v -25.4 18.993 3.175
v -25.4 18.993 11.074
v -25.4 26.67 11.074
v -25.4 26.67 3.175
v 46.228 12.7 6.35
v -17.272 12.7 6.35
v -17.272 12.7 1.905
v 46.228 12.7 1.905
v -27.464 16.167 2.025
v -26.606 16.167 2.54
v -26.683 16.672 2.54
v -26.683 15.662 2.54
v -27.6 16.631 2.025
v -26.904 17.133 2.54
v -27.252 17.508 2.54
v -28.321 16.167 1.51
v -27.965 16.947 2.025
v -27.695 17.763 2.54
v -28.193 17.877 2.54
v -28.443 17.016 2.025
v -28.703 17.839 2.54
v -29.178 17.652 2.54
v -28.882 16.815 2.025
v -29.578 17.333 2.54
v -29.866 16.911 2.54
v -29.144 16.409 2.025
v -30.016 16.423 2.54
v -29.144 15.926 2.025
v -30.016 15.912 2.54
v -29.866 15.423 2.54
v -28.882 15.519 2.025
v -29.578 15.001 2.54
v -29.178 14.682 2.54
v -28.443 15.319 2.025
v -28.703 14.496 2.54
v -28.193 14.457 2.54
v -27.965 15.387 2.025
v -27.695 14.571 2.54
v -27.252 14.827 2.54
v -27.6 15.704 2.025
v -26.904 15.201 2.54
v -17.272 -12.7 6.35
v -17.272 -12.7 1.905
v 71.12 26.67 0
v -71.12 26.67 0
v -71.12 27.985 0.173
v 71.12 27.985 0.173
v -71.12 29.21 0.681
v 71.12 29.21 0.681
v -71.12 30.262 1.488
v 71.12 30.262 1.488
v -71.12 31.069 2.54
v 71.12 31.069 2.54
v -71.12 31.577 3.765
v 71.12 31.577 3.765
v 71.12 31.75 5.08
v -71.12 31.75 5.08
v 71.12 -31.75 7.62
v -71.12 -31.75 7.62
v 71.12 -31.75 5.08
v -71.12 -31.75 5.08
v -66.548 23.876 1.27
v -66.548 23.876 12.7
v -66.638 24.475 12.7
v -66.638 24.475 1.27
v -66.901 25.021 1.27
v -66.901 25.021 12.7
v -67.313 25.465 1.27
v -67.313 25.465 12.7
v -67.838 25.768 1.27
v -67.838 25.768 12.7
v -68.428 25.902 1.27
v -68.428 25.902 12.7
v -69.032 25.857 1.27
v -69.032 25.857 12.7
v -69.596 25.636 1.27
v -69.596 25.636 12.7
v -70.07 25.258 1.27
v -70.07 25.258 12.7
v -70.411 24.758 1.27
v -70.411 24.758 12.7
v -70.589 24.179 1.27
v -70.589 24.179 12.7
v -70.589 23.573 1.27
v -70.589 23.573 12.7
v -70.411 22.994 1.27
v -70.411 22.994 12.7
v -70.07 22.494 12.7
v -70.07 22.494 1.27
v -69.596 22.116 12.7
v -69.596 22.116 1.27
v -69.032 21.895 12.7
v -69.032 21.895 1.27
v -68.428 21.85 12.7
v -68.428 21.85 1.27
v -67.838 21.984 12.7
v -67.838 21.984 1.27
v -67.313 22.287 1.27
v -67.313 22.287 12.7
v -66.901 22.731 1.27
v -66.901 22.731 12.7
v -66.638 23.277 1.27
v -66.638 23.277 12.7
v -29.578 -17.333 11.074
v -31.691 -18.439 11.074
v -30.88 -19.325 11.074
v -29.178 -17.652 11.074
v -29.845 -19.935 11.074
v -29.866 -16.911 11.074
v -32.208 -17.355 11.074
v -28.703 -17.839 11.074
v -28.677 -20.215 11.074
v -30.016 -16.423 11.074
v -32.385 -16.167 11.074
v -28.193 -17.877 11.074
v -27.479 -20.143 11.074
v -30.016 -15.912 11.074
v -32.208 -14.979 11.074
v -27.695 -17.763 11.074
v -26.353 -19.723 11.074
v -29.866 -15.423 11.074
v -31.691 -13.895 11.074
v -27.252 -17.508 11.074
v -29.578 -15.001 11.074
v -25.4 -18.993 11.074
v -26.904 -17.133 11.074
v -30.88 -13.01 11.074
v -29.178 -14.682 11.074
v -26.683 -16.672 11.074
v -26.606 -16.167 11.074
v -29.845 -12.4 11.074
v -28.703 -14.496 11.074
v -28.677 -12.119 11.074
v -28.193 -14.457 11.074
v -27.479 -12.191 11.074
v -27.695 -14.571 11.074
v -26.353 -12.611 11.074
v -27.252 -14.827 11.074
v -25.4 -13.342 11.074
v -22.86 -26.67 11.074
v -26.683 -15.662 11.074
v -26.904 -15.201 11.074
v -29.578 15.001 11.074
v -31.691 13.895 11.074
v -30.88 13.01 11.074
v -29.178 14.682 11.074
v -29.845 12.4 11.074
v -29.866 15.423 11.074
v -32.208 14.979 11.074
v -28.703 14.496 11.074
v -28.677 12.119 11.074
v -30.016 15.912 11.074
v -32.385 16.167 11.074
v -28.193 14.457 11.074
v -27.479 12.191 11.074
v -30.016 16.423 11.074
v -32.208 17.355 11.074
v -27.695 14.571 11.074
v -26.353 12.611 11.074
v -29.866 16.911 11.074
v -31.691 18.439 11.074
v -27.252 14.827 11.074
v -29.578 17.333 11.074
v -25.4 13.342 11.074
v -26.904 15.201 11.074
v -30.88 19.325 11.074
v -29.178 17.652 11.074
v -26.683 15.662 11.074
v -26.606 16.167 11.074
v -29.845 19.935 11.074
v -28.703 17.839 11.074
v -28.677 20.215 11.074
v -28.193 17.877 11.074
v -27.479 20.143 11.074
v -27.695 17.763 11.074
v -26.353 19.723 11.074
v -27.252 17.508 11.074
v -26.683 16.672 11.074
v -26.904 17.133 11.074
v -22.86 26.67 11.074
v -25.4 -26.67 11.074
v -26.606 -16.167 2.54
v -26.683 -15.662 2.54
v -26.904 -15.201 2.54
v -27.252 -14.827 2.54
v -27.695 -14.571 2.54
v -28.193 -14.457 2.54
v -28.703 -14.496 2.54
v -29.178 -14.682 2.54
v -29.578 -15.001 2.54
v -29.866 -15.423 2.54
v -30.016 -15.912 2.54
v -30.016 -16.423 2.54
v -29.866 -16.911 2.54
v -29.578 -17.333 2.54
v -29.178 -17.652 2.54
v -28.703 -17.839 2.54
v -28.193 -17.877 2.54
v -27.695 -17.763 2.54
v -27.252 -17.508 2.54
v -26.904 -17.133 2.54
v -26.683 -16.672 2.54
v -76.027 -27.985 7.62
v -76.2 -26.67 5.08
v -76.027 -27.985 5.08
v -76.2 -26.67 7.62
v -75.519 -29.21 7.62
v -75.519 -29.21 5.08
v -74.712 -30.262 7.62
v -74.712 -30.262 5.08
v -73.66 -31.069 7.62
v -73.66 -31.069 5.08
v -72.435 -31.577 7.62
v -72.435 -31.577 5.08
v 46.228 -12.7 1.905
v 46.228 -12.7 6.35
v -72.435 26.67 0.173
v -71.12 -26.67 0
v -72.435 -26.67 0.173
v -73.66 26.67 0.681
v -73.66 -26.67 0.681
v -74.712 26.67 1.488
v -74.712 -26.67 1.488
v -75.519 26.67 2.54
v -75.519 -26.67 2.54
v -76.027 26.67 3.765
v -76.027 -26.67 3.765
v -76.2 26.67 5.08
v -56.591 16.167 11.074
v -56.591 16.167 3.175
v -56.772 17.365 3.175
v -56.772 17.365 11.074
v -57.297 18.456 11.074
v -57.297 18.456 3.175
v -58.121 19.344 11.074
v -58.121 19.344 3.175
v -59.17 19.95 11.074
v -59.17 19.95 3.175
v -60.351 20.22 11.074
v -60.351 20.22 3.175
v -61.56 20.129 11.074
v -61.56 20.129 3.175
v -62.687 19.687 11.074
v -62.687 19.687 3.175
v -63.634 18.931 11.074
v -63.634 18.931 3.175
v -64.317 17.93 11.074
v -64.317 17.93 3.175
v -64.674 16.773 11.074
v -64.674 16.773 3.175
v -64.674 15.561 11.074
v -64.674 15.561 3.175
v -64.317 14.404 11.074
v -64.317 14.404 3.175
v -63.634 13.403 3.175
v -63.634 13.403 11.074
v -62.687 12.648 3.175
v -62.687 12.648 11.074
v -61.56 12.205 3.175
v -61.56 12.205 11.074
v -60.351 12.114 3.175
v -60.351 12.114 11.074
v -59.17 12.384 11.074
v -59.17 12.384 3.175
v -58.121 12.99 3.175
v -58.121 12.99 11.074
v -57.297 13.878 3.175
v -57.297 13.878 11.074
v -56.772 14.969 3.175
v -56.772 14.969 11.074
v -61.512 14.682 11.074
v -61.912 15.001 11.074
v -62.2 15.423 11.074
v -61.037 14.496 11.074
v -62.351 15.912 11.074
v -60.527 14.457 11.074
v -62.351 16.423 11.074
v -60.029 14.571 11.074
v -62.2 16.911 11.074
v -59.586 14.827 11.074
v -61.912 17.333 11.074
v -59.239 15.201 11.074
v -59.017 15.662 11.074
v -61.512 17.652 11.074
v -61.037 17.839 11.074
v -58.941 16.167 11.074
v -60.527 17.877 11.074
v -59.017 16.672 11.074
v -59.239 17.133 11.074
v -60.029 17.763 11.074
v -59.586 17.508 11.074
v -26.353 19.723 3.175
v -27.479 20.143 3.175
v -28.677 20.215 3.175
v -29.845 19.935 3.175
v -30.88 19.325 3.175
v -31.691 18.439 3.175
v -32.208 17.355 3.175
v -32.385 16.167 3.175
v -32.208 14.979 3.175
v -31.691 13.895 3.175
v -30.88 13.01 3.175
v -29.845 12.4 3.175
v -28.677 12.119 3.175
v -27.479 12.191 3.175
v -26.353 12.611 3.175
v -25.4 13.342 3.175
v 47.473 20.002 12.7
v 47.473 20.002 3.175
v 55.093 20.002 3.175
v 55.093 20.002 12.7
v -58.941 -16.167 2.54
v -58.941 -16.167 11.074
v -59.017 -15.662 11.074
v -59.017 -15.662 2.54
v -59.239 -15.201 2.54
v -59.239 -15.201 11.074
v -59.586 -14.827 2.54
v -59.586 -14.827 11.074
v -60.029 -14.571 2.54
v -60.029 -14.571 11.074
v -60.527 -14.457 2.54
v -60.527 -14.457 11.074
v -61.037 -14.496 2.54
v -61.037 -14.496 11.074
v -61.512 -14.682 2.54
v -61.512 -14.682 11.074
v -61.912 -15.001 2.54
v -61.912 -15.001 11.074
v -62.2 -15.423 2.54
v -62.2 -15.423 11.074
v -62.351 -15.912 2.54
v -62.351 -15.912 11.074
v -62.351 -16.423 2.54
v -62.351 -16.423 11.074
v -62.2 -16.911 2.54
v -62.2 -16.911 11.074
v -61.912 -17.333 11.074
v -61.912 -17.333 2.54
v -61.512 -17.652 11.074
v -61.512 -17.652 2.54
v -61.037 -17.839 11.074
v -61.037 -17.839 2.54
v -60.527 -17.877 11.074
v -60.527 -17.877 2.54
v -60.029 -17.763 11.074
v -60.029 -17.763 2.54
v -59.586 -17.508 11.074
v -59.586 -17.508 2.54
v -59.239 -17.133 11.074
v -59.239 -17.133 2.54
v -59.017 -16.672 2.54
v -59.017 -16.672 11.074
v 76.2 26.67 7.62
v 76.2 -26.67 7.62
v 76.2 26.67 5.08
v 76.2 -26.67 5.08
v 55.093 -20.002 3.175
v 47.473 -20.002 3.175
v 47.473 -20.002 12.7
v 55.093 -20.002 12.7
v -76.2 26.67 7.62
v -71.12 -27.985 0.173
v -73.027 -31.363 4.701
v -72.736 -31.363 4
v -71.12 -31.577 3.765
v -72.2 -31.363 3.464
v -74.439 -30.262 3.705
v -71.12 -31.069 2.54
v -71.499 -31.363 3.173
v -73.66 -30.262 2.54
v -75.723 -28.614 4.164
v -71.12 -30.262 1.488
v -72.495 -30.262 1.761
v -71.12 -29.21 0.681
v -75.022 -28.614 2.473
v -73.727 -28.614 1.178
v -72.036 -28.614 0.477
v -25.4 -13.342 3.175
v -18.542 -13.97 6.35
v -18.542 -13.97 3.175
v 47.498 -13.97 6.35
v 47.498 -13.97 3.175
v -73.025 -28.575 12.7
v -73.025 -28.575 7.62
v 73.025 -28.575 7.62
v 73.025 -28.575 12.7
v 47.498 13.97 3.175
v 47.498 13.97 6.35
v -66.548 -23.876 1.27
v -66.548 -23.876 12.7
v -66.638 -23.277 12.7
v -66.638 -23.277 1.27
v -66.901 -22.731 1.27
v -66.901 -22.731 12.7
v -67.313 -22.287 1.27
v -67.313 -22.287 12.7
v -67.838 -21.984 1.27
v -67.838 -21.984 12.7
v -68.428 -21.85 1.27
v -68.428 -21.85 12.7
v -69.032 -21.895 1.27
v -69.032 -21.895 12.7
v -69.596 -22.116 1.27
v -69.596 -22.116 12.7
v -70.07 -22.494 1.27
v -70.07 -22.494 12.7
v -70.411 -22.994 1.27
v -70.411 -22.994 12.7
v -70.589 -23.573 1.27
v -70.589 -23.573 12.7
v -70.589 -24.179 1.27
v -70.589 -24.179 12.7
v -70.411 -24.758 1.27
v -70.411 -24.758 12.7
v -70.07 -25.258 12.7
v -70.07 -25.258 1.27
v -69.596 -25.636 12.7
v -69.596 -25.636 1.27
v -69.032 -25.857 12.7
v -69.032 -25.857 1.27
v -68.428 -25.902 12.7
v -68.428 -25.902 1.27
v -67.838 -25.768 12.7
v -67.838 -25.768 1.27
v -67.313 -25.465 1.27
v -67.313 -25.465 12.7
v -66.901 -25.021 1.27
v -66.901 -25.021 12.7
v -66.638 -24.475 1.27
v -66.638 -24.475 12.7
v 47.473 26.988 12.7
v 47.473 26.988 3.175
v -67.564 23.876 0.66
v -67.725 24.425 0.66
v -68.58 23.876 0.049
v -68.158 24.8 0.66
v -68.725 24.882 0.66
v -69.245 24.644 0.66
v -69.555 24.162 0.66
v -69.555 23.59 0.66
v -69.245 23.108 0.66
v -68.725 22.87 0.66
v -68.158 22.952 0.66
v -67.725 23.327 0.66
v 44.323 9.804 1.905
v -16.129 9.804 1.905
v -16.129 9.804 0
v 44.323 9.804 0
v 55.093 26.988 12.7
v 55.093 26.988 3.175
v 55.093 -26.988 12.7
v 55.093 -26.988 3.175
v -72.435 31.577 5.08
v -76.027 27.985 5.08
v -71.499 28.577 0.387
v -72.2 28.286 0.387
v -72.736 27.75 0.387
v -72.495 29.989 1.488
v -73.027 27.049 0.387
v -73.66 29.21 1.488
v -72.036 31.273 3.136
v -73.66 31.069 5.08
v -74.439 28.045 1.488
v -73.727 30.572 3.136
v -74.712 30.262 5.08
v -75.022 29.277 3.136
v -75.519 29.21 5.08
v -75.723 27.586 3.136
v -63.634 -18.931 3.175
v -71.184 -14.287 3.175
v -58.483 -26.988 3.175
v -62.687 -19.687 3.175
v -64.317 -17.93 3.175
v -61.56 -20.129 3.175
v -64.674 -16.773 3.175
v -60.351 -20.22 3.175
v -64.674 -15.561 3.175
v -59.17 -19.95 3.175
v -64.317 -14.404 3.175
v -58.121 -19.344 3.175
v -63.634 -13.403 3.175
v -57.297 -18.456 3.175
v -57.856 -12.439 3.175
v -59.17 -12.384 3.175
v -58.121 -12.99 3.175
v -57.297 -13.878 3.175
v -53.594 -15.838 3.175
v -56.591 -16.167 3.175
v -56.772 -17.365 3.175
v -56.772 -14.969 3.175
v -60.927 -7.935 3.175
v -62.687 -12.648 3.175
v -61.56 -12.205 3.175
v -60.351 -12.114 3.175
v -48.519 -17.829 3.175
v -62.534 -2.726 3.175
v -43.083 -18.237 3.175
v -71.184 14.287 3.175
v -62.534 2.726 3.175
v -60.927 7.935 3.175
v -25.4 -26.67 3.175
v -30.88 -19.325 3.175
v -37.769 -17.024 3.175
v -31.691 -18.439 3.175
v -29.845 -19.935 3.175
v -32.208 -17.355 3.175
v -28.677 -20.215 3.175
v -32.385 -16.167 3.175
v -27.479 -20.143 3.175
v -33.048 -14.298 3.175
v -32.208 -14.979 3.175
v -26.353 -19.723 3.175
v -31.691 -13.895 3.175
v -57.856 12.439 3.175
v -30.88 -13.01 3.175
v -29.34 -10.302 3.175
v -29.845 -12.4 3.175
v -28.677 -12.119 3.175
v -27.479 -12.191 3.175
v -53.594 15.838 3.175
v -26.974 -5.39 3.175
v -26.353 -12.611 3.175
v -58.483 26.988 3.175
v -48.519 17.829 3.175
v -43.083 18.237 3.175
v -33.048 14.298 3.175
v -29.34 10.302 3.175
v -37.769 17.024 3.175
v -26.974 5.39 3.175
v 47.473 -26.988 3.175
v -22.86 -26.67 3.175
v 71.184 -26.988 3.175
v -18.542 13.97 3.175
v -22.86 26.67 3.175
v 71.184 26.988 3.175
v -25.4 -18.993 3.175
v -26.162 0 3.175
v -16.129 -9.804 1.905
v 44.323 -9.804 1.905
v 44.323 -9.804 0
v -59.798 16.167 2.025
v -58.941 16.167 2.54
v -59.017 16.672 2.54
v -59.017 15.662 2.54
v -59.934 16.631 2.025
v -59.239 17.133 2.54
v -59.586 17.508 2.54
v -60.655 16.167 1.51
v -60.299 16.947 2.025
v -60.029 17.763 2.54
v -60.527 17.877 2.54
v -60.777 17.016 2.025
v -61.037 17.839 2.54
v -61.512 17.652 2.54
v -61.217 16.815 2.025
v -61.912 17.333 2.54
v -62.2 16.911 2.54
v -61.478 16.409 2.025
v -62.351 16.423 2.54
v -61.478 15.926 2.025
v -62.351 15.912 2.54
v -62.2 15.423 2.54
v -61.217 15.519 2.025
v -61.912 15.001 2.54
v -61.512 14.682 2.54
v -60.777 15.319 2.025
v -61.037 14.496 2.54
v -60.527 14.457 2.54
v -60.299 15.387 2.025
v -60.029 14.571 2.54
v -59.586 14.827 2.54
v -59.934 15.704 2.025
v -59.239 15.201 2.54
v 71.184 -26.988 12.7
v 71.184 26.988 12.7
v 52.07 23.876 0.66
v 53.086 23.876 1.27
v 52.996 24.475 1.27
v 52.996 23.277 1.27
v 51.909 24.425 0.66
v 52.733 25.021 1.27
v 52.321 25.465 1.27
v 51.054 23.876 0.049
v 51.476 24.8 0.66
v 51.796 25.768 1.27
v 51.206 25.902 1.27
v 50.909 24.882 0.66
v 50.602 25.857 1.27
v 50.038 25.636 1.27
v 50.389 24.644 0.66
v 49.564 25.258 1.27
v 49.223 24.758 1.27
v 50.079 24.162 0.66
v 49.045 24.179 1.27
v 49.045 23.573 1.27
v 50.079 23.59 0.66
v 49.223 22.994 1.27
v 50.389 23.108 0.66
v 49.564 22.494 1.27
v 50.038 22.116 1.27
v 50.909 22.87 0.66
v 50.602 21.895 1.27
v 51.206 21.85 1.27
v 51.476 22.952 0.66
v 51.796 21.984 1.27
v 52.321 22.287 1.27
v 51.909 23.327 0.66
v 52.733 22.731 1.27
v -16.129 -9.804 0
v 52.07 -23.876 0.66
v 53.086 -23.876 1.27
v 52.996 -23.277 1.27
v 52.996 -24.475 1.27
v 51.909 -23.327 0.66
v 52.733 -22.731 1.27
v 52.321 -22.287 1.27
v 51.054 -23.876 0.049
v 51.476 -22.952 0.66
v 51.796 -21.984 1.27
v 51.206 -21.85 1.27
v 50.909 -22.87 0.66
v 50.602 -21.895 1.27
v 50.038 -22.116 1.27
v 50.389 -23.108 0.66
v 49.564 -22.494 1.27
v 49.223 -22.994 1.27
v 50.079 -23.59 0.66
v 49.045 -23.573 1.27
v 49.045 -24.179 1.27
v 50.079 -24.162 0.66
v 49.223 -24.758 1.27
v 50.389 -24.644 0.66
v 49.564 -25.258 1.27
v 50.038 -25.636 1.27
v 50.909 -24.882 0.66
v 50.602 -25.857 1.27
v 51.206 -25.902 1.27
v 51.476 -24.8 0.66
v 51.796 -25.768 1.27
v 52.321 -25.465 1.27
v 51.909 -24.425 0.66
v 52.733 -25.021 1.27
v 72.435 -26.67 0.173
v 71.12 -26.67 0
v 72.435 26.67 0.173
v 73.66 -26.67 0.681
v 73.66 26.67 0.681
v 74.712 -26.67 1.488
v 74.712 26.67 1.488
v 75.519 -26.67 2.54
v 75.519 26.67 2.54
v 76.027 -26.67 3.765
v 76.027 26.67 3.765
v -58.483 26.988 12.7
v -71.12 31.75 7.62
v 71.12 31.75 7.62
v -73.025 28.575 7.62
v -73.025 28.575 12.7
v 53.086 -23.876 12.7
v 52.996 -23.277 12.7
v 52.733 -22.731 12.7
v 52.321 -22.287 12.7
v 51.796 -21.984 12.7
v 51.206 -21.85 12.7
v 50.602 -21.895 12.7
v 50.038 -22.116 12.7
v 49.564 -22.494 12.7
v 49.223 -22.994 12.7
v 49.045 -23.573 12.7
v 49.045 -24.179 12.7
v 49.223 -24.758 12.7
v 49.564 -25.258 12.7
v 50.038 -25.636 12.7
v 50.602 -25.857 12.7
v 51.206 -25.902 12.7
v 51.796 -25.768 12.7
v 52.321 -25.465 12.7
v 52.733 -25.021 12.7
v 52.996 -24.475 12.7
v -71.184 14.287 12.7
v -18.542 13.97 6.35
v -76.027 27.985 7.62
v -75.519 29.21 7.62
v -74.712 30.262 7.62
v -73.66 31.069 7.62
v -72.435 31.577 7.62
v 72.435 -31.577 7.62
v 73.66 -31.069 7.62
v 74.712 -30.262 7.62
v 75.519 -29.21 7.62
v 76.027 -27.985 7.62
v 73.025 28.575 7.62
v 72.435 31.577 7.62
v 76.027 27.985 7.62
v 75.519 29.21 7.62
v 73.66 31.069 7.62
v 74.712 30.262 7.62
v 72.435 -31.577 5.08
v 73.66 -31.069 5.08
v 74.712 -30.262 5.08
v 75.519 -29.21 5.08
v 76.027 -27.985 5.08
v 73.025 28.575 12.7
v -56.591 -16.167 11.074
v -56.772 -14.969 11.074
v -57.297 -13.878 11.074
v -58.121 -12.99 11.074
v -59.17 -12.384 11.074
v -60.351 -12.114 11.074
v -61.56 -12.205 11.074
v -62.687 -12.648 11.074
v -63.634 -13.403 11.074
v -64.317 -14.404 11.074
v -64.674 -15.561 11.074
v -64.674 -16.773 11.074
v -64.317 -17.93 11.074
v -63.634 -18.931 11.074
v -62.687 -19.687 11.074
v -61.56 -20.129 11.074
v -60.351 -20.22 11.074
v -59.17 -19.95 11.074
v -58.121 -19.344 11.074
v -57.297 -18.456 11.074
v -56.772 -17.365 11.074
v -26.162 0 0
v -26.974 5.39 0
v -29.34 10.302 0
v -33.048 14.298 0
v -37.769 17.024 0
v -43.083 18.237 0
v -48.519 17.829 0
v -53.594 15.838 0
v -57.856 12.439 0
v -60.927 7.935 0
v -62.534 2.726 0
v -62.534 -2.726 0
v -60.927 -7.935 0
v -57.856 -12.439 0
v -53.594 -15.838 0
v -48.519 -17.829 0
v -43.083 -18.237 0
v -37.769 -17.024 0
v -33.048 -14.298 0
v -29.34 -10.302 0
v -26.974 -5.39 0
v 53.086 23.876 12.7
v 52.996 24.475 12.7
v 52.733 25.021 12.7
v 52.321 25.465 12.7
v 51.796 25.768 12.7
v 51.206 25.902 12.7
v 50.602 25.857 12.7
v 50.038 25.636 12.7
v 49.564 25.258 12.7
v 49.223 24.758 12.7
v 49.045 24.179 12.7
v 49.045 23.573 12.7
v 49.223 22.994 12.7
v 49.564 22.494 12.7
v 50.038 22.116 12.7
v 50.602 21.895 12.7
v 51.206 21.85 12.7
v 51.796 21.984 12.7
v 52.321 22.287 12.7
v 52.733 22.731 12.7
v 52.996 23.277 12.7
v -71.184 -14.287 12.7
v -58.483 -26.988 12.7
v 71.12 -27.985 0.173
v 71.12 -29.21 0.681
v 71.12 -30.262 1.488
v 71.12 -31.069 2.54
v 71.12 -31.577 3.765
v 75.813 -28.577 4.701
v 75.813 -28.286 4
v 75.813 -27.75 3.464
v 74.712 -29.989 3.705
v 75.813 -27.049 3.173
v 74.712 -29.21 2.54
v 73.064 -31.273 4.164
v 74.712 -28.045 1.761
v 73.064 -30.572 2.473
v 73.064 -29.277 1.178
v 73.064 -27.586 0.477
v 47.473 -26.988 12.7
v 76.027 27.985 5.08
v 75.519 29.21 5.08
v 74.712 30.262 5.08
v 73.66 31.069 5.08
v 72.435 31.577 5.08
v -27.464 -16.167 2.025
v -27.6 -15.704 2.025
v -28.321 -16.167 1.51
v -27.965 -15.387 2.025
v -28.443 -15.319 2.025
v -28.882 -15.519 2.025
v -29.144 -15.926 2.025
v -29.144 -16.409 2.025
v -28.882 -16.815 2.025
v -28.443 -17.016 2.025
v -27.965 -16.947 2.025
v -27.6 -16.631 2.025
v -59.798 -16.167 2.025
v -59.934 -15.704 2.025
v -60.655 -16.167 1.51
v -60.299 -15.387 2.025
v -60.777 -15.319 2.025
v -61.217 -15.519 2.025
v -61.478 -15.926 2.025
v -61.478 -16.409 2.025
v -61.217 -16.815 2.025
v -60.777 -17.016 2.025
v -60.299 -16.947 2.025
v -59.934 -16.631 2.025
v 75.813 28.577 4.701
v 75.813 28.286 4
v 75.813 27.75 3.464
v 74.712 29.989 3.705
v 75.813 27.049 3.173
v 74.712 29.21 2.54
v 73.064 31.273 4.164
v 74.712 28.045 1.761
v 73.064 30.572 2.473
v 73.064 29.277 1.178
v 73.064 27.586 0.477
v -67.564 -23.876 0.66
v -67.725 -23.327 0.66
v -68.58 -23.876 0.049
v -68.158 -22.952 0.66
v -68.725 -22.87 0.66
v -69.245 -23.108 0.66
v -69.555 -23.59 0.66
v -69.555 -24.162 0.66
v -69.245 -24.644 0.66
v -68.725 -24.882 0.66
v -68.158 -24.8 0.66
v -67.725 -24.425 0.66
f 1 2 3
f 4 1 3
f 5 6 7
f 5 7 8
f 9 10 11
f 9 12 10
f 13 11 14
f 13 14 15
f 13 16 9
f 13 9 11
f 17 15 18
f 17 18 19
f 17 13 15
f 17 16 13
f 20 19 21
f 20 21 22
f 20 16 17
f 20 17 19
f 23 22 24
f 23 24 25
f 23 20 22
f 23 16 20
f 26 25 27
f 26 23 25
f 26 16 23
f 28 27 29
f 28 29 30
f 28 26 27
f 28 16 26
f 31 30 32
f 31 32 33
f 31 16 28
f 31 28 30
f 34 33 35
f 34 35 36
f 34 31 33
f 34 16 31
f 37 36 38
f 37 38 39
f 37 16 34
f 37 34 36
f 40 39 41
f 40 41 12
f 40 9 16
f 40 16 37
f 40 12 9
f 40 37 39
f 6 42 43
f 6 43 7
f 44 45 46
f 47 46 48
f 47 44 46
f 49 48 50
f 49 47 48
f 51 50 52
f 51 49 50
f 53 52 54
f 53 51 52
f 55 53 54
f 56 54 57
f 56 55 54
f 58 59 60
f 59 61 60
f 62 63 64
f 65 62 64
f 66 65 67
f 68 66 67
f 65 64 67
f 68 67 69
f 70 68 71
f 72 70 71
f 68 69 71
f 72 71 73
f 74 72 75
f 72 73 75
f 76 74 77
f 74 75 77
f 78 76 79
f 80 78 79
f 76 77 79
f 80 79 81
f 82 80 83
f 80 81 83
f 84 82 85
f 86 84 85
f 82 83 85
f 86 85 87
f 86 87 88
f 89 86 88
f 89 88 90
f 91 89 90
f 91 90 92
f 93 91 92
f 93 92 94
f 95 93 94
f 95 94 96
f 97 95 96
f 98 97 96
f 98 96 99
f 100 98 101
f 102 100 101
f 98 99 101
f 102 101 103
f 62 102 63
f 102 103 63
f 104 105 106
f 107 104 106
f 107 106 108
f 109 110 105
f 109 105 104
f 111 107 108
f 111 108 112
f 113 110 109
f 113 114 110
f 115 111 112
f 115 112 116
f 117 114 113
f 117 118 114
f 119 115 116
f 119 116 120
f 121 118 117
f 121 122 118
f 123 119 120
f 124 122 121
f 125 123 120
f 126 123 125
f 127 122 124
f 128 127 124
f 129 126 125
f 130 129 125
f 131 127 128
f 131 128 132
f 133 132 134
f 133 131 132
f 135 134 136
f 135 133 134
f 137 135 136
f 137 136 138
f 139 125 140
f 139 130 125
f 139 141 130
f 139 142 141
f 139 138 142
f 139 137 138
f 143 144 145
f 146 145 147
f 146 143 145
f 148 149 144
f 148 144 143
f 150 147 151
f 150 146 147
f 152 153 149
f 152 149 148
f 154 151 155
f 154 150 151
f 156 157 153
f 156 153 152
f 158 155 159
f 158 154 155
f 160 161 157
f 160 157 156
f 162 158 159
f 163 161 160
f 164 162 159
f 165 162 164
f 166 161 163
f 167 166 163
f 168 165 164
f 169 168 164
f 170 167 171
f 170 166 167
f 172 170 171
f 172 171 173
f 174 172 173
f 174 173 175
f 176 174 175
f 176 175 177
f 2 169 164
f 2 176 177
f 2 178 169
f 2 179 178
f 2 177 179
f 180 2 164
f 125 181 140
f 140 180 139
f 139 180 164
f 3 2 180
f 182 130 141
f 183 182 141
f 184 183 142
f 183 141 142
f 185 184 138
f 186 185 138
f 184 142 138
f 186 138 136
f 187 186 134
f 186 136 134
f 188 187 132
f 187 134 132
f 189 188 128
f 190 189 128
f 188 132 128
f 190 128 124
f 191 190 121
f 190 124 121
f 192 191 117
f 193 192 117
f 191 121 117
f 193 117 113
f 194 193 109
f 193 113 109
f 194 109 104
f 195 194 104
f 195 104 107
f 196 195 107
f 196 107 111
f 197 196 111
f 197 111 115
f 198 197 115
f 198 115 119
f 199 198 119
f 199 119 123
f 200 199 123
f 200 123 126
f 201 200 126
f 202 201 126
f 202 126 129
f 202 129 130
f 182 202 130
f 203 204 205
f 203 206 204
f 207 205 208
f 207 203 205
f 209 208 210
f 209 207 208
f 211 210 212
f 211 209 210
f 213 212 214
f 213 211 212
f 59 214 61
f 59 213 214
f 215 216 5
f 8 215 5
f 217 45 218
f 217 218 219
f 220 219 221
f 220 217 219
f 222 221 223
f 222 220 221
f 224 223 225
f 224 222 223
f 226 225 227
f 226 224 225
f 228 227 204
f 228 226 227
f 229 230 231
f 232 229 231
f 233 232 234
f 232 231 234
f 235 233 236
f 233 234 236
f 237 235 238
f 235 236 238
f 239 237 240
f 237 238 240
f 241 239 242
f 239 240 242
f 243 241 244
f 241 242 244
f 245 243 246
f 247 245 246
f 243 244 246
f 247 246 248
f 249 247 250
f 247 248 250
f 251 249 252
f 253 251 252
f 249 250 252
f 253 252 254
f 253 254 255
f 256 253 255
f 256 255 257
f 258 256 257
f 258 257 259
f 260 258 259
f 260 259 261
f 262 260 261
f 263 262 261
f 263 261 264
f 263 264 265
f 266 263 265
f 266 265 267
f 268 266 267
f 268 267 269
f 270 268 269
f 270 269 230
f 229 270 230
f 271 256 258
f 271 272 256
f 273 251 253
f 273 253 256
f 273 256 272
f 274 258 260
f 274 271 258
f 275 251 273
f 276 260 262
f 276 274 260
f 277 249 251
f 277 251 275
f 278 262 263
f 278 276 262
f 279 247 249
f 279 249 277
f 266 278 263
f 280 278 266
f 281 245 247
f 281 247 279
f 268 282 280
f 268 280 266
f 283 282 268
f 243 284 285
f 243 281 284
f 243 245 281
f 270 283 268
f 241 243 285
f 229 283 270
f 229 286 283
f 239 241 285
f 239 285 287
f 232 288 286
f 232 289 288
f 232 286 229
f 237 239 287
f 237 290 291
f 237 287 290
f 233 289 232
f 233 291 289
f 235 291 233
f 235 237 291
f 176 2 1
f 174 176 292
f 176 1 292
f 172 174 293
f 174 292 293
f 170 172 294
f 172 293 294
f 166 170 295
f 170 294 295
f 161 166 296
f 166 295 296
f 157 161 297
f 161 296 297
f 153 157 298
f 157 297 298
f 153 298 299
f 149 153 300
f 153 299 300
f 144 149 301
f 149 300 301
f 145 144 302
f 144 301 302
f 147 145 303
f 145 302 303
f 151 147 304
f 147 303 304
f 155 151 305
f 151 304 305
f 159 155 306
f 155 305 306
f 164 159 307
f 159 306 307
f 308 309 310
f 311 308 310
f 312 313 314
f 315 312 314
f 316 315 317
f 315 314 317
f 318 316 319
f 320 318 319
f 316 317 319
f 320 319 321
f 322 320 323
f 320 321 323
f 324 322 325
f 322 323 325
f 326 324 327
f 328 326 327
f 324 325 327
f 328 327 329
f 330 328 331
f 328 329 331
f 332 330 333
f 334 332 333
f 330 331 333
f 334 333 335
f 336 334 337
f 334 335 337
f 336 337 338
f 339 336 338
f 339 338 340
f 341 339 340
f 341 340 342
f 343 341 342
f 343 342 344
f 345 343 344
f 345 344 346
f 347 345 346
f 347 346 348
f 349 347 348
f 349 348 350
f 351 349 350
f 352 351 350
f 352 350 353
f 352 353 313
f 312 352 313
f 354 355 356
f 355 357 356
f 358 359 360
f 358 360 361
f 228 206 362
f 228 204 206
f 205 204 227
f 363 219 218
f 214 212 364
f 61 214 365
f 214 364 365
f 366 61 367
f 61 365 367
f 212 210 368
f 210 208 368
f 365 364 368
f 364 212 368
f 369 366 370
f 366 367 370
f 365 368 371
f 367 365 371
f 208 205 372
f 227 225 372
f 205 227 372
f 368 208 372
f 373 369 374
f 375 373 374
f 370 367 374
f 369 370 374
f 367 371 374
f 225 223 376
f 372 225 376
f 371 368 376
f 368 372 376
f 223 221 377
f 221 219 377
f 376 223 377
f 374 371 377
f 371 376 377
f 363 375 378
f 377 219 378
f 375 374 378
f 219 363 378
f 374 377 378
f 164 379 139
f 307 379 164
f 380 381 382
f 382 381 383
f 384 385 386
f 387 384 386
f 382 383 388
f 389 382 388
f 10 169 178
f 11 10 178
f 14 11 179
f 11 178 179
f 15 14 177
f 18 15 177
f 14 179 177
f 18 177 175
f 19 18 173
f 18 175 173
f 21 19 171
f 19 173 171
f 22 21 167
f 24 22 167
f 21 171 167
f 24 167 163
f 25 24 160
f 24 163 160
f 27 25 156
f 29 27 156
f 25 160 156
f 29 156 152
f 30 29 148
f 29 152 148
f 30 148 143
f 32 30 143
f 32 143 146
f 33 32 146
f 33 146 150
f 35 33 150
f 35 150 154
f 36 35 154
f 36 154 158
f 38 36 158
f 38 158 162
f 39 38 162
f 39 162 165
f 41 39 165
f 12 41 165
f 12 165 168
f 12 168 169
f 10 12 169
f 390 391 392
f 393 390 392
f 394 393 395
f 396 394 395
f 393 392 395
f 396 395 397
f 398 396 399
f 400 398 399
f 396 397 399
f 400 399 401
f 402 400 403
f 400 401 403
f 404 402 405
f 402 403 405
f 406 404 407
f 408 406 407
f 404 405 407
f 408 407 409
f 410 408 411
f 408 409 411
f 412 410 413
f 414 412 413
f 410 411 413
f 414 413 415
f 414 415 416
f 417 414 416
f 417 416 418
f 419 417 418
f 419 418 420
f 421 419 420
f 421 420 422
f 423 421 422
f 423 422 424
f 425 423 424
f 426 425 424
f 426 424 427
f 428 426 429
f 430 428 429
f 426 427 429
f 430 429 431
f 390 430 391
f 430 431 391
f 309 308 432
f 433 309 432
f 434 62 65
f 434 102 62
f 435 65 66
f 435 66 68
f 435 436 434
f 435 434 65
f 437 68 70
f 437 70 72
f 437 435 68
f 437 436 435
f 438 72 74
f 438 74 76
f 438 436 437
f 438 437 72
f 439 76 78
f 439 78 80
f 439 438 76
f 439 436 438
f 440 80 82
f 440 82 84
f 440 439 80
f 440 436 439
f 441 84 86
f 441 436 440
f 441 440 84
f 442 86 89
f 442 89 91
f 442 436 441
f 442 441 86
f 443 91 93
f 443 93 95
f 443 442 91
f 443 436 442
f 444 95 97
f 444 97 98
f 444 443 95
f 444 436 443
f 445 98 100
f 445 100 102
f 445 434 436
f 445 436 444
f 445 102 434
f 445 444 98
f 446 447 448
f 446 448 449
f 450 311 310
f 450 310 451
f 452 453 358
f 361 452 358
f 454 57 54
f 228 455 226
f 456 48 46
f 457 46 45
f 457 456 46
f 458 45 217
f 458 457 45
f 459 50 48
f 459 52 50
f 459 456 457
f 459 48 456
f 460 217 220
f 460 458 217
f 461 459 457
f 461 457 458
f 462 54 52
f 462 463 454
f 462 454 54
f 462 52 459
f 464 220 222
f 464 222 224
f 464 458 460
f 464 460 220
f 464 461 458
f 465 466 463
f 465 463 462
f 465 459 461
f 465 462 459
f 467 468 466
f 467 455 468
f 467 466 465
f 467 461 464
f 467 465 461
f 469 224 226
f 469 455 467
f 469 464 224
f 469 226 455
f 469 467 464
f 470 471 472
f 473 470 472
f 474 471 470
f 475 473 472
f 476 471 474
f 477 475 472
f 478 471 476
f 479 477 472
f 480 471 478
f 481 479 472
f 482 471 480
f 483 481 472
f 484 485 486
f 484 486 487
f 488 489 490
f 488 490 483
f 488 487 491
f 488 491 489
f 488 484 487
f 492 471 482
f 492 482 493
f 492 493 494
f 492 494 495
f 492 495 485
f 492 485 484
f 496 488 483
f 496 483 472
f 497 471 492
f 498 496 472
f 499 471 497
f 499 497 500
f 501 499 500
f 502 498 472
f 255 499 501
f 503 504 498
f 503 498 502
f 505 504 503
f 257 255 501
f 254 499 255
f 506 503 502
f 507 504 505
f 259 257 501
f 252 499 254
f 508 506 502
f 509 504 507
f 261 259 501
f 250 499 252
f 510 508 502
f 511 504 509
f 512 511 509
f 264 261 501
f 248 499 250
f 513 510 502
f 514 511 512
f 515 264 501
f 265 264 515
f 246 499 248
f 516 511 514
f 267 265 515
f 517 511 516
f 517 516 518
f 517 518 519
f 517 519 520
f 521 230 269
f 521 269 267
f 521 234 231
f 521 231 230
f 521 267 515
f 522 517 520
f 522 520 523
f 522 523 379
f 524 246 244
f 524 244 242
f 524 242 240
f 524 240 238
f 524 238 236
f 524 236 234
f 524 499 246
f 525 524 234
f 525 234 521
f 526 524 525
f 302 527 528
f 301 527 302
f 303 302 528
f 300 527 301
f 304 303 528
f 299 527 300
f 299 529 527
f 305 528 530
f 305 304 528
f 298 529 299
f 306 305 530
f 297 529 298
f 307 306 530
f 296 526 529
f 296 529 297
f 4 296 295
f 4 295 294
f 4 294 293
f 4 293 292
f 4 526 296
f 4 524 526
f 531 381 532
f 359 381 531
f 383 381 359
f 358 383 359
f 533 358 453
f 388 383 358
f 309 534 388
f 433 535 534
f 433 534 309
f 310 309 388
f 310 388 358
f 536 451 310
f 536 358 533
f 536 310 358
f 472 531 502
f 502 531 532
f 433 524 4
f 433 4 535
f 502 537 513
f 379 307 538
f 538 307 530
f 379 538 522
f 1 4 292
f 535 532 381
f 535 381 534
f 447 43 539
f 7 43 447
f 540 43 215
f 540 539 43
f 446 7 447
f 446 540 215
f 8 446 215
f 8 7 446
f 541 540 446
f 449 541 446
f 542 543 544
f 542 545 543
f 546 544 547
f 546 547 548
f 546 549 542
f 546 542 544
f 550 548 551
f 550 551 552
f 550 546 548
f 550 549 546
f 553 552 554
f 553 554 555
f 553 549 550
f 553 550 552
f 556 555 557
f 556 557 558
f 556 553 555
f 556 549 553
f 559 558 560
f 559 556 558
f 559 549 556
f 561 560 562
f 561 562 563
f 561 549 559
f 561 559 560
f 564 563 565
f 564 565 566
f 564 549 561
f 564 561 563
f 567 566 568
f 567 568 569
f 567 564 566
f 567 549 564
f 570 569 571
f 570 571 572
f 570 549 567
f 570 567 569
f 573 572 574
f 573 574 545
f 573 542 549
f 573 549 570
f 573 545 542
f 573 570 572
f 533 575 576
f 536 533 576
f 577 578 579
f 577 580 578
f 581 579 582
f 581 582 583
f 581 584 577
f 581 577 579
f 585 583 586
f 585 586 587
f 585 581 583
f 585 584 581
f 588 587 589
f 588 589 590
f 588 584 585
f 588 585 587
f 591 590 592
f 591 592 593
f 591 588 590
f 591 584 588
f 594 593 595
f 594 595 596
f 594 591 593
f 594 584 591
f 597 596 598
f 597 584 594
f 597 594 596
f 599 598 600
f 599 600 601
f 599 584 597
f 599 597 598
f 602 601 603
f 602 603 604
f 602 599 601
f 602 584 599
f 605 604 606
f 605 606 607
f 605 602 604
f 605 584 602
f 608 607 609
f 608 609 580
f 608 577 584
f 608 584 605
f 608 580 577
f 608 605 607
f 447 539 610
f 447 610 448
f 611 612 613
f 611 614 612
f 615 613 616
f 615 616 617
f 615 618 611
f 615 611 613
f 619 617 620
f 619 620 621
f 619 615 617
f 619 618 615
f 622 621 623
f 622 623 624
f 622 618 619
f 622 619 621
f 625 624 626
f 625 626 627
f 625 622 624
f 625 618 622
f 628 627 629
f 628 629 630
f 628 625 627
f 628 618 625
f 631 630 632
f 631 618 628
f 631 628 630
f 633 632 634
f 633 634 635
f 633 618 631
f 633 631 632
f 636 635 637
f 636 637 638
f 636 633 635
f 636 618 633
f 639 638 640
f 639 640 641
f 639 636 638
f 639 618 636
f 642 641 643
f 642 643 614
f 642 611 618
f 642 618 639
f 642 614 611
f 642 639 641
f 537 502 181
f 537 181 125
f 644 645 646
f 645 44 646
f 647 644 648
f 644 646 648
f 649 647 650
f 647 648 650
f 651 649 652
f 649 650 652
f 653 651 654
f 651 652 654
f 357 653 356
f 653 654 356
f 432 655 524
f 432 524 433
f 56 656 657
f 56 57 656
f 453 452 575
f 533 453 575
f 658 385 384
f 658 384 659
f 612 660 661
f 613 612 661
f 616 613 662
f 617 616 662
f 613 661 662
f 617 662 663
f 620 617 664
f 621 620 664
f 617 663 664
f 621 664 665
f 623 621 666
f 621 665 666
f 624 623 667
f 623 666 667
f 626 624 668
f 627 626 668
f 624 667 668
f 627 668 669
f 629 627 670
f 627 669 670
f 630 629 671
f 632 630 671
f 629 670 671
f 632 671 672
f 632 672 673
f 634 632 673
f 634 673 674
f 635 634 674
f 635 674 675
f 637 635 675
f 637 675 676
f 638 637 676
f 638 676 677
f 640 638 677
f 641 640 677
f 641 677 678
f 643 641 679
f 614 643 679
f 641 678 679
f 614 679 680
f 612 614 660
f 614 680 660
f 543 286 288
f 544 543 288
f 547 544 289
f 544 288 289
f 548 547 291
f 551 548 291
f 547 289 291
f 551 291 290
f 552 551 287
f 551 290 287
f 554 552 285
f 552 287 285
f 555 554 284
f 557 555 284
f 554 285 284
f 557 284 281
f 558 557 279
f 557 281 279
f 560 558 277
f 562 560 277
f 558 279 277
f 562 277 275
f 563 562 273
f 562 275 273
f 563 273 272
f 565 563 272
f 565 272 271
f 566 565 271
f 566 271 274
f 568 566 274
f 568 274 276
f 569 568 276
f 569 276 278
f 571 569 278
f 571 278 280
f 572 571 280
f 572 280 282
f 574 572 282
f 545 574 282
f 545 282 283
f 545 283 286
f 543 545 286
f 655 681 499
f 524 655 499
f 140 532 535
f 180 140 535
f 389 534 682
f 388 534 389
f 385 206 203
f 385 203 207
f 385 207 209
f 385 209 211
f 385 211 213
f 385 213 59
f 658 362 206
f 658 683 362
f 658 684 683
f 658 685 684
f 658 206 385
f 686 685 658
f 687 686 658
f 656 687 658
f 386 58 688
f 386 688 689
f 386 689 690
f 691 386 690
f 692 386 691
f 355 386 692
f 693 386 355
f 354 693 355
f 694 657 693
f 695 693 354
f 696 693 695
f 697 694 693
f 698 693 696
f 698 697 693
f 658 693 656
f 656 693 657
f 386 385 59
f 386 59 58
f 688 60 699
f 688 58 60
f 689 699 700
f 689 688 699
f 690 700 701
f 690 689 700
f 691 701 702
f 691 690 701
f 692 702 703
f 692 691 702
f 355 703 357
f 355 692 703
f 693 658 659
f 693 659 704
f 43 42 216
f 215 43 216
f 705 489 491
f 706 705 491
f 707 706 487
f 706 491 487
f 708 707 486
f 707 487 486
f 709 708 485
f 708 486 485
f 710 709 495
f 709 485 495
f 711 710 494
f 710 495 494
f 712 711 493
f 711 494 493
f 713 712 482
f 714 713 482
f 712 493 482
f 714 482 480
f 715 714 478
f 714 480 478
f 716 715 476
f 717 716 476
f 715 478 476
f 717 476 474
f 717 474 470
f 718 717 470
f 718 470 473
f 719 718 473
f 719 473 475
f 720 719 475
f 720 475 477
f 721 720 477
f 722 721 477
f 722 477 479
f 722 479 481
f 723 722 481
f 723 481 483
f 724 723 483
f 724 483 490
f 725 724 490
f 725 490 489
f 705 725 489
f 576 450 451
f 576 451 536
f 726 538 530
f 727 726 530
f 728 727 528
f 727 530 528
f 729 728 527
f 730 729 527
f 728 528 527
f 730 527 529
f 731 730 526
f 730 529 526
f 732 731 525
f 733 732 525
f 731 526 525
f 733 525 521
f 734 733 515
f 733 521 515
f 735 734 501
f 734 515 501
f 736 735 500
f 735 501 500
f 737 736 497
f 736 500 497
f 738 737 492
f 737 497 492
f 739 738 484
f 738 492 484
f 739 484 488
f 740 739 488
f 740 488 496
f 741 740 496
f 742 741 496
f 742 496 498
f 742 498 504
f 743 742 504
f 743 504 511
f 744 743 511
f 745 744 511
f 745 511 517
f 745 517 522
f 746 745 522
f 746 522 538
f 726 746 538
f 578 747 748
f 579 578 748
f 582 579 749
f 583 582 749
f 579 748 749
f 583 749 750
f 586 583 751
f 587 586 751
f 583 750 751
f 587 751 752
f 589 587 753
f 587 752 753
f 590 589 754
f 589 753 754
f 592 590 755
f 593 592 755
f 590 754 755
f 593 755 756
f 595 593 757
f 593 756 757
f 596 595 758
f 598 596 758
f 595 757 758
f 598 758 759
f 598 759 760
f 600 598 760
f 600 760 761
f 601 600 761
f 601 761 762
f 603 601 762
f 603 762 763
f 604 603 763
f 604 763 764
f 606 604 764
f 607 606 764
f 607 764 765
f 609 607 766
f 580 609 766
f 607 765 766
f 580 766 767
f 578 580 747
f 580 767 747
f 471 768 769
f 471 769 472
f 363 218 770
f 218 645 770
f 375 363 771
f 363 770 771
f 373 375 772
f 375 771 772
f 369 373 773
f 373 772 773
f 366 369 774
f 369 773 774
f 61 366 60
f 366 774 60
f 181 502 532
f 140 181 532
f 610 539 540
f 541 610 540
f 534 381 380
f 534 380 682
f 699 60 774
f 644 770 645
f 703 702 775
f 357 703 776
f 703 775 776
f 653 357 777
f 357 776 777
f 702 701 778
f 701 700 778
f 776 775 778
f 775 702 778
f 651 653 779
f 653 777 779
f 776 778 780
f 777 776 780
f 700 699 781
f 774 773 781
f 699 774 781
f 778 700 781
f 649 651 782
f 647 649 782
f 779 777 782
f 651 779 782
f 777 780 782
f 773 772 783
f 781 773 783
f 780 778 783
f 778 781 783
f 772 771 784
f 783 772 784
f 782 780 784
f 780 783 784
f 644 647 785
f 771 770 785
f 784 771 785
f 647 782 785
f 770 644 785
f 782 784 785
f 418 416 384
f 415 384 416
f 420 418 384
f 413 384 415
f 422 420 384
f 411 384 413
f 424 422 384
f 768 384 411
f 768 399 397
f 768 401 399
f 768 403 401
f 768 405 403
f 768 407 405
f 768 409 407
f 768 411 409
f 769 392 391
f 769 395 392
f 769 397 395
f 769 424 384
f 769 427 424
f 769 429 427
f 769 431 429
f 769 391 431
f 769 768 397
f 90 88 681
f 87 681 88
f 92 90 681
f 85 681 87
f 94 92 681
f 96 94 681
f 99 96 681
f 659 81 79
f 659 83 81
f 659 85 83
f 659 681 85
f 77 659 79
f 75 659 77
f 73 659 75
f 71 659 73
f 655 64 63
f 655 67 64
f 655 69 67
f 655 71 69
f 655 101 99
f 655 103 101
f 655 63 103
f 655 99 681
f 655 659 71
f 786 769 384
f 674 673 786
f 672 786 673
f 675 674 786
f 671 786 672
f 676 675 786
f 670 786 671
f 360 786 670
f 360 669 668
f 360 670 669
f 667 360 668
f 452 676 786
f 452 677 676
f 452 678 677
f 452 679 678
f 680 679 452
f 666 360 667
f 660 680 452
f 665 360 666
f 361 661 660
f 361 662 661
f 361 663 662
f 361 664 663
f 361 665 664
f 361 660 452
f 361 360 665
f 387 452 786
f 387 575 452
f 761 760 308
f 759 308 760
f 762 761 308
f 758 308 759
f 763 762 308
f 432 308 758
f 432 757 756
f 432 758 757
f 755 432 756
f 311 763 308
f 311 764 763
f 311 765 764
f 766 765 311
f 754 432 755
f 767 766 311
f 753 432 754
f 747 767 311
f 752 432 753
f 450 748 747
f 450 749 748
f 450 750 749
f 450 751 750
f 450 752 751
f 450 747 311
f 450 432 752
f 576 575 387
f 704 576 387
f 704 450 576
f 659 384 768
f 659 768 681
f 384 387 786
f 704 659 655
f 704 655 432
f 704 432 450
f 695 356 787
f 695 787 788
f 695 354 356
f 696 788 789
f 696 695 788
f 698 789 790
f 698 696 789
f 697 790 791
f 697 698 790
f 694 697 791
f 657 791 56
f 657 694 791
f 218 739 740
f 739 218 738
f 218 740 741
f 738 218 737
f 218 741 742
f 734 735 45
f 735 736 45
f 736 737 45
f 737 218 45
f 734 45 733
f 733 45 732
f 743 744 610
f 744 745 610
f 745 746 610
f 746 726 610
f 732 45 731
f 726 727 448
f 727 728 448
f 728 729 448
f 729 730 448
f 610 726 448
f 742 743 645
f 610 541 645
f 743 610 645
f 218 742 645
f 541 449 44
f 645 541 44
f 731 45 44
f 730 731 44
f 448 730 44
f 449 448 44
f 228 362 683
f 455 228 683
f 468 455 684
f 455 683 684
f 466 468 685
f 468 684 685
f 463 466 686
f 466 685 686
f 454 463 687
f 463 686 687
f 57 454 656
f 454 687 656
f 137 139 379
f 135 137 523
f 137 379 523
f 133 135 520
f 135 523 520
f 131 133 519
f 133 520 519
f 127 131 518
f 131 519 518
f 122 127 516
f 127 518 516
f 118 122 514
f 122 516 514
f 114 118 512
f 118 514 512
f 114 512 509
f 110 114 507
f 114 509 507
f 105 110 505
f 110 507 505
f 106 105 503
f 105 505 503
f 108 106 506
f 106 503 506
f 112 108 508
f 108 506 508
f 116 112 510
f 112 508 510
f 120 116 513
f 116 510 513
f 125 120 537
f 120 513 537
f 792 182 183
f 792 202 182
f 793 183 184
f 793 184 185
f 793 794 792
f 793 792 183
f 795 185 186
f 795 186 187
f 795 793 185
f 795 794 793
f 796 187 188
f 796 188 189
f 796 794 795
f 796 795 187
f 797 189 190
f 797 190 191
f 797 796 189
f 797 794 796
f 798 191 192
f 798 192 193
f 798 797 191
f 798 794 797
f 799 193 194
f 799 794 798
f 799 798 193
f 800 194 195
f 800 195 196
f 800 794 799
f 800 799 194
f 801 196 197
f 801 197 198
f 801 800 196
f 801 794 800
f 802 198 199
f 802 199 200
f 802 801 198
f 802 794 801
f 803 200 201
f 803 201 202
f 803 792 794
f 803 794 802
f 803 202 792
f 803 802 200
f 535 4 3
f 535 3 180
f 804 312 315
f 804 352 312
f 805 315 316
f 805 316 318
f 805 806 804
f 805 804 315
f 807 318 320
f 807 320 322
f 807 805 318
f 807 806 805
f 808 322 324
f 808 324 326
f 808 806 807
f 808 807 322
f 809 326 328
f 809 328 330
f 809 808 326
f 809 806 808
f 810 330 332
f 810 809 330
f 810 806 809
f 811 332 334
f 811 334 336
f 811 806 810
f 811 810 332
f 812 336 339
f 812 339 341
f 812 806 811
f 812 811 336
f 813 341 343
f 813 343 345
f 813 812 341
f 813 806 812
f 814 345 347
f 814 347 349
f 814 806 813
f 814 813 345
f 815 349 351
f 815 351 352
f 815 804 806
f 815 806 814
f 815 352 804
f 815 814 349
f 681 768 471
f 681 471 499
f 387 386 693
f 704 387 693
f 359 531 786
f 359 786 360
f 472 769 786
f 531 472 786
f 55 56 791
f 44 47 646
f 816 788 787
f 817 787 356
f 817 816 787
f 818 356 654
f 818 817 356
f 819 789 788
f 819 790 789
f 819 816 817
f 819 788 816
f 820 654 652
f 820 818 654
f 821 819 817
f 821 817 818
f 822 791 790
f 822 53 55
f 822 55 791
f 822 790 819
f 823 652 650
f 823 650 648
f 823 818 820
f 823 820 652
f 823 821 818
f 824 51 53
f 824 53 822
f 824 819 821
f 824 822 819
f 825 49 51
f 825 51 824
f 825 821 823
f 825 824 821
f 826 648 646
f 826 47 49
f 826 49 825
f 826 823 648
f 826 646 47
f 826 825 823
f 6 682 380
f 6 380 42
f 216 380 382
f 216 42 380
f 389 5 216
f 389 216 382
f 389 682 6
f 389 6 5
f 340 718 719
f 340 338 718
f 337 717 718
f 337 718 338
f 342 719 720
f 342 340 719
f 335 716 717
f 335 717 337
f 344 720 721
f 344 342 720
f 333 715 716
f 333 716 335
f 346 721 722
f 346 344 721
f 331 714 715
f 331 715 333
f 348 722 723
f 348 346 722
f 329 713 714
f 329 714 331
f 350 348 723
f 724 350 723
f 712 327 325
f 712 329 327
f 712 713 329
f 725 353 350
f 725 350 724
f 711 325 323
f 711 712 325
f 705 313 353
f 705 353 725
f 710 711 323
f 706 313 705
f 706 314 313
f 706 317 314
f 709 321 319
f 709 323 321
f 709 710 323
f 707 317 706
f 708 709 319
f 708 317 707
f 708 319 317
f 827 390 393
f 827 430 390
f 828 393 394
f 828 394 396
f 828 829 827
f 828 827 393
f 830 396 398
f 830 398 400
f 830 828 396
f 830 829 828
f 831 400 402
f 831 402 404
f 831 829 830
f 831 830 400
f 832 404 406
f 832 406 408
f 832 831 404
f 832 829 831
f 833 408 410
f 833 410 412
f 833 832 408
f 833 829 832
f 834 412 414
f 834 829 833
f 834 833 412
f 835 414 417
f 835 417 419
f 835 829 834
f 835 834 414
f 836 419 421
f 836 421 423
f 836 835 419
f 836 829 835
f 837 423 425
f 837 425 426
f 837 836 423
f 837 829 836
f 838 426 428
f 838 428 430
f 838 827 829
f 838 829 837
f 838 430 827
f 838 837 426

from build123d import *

# Parameters (mm, degrees)
SKETCH_W        = 152.4
SKETCH_H        = 63.5
PAD_DEPTH       = 7.62
SKETCH001_W     = 146.05
SKETCH001_H     = 57.15
PAD001_DEPTH    = 12.7
SKETCH002_W     = 142.367
SKETCH002_H     = 53.975
POCKET_DEPTH    = 9.525
CHAMFER_SIZE    = 12.7
SKETCH003_R     = 18.288
POCKET001_DEPTH = 25.401
SKETCH004_R     = 4.064
PAD002_DEPTH    = 11.0744
SKETCH005_R     = 1.7145
HOLE_DEPTH      = 10.16
HOLE_TIPS_R     = 1.7145
SKETCH006_W     = 2.54
SKETCH006_H     = 53.34
PAD003_DEPTH    = 11.0744
SKETCH008_W     = 66.04
SKETCH008_H     = 27.94
PAD004_DEPTH    = 6.35
SKETCH009_W     = 63.5
SKETCH009_H     = 25.4
POCKET003_DEPTH = 4.445
SKETCH010_W     = 60.452
SKETCH010_H     = 19.6088
POCKET004_DEPTH = 12.701
SKETCH011_W     = 7.62
SKETCH011_H     = 7.62
PAD005_DEPTH    = 12.7
SKETCH012_R     = 2.032
HOLE001_DEPTH   = 11.43
HOLE001_TIPS_R  = 2.032
FILLET_R        = 5.08


with BuildPart() as part:
    # Sketch → Pad (new body)
    with BuildSketch(Plane.XY):
        Rectangle(SKETCH_W, SKETCH_H)
    extrude(amount=PAD_DEPTH)

    # Sketch001 → Pad001 (join)
    with BuildSketch(Plane.XY):
        Rectangle(SKETCH001_W, SKETCH001_H)
    extrude(amount=PAD001_DEPTH)

    # Sketch002 → Pocket (cut)
    with BuildSketch(Plane.XY.offset(12.7)):
        Rectangle(SKETCH002_W, SKETCH002_H)
    extrude(amount=-POCKET_DEPTH, mode=Mode.SUBTRACT)

    # Chamfer
    chamfer_edges = [part.edges().sort_by_distance(p)[0] for p in [
        (-71.1835, 26.9875, 7.9375),
        (-71.1835, -26.9875, 7.9375),
    ]]
    chamfer(chamfer_edges, length=CHAMFER_SIZE)

    # Sketch003 → Pocket001 (cut, through all)
    with BuildSketch(Plane.XY.offset(25.4)):
        with Locations((-44.45, 0)):
            Circle(SKETCH003_R)
    extrude(amount=-POCKET001_DEPTH, mode=Mode.SUBTRACT)

    # Sketch004 → Pad002 (join)
    with BuildSketch(Plane.XY):
        with Locations((-60.6552, -16.1671)):
            Circle(SKETCH004_R)
        with Locations((-28.321, -16.1671)):
            Circle(SKETCH004_R)
        with Locations((-28.321, 16.1671)):
            Circle(SKETCH004_R)
        with Locations((-60.6552, 16.1671)):
            Circle(SKETCH004_R)
    extrude(amount=PAD002_DEPTH)

    # Sketch005 → Hole (cut)
    with BuildSketch(Plane.XY.offset(12.7)):
        with Locations((-60.6552, -16.1671)):
            Circle(SKETCH005_R)
        with Locations((-28.321, -16.1671)):
            Circle(SKETCH005_R)
        with Locations((-28.321, 16.1671)):
            Circle(SKETCH005_R)
        with Locations((-60.6552, 16.1671)):
            Circle(SKETCH005_R)
    extrude(amount=-HOLE_DEPTH, mode=Mode.SUBTRACT)

    # Hole tips → Hole tip 1 section 0
    with BuildSketch(Plane.XY.offset(2.54), mode=Mode.PRIVATE) as hole_tip_1_s0:
        with Locations((-60.6552, -16.1671)):
            Circle(HOLE_TIPS_R)
    loft([hole_tip_1_s0.sketch, Vertex(-60.6552, -16.1671, 1.509824)], mode=Mode.SUBTRACT)

    # Hole tips → Hole tip 2 section 0
    with BuildSketch(Plane.XY.offset(2.54), mode=Mode.PRIVATE) as hole_tip_2_s0:
        with Locations((-28.321, -16.1671)):
            Circle(HOLE_TIPS_R)
    loft([hole_tip_2_s0.sketch, Vertex(-28.321, -16.1671, 1.509824)], mode=Mode.SUBTRACT)

    # Hole tips → Hole tip 3 section 0
    with BuildSketch(Plane.XY.offset(2.54), mode=Mode.PRIVATE) as hole_tip_3_s0:
        with Locations((-28.321, 16.1671)):
            Circle(HOLE_TIPS_R)
    loft([hole_tip_3_s0.sketch, Vertex(-28.321, 16.1671, 1.509824)], mode=Mode.SUBTRACT)

    # Hole tips → Hole tip 4 section 0
    with BuildSketch(Plane.XY.offset(2.54), mode=Mode.PRIVATE) as hole_tip_4_s0:
        with Locations((-60.6552, 16.1671)):
            Circle(HOLE_TIPS_R)
    loft([hole_tip_4_s0.sketch, Vertex(-60.6552, 16.1671, 1.509824)], mode=Mode.SUBTRACT)

    # Sketch006 → Pad003 (join)
    with BuildSketch(Plane.XY):
        with Locations((-24.13, 0)):
            Rectangle(SKETCH006_W, SKETCH006_H)
    extrude(amount=PAD003_DEPTH)

    # Sketch008 → Pad004 (join)
    with BuildSketch(Plane.XY):
        with Locations((14.478, 0)):
            Rectangle(SKETCH008_W, SKETCH008_H)
    extrude(amount=PAD004_DEPTH)

    # Sketch009 → Pocket003 (cut)
    with BuildSketch(Plane.XY.offset(6.35)):
        with Locations((14.478, 0)):
            Rectangle(SKETCH009_W, SKETCH009_H)
    extrude(amount=-POCKET003_DEPTH, mode=Mode.SUBTRACT)

    # Sketch010 → Pocket004 (cut, through all)
    with BuildSketch(Plane.XY.offset(12.7)):
        with Locations((14.097, 0)):
            Rectangle(SKETCH010_W, SKETCH010_H)
    extrude(amount=-POCKET004_DEPTH, mode=Mode.SUBTRACT)

    # Sketch011 → Pad005 (join)
    with BuildSketch(Plane.XY):
        with Locations((51.2826, 23.8125)):
            Rectangle(SKETCH011_W, SKETCH011_H)
        with Locations((51.2826, -23.8125)):
            Rectangle(SKETCH011_W, SKETCH011_H)
    extrude(amount=PAD005_DEPTH)

    # Sketch012 → Hole001 (cut)
    with BuildSketch(Plane.XY.offset(12.7)):
        with Locations((-68.58, 23.876)):
            Circle(SKETCH012_R)
        with Locations((-68.58, -23.876)):
            Circle(SKETCH012_R)
        with Locations((51.054, 23.876)):
            Circle(SKETCH012_R)
        with Locations((51.054, -23.876)):
            Circle(SKETCH012_R)
    extrude(amount=-HOLE001_DEPTH, mode=Mode.SUBTRACT)

    # Hole001 tips → Hole001 tip 1 section 0
    with BuildSketch(Plane.XY.offset(1.27), mode=Mode.PRIVATE) as hole001_tip_1_s0:
        with Locations((-68.58, 23.876)):
            Circle(HOLE001_TIPS_R)
    loft([hole001_tip_1_s0.sketch, Vertex(-68.58, 23.876, 0.049051)], mode=Mode.SUBTRACT)

    # Hole001 tips → Hole001 tip 2 section 0
    with BuildSketch(Plane.XY.offset(1.27), mode=Mode.PRIVATE) as hole001_tip_2_s0:
        with Locations((-68.58, -23.876)):
            Circle(HOLE001_TIPS_R)
    loft([hole001_tip_2_s0.sketch, Vertex(-68.58, -23.876, 0.049051)], mode=Mode.SUBTRACT)

    # Hole001 tips → Hole001 tip 3 section 0
    with BuildSketch(Plane.XY.offset(1.27), mode=Mode.PRIVATE) as hole001_tip_3_s0:
        with Locations((51.054, 23.876)):
            Circle(HOLE001_TIPS_R)
    loft([hole001_tip_3_s0.sketch, Vertex(51.054, 23.876, 0.049051)], mode=Mode.SUBTRACT)

    # Hole001 tips → Hole001 tip 4 section 0
    with BuildSketch(Plane.XY.offset(1.27), mode=Mode.PRIVATE) as hole001_tip_4_s0:
        with Locations((51.054, -23.876)):
            Circle(HOLE001_TIPS_R)
    loft([hole001_tip_4_s0.sketch, Vertex(51.054, -23.876, 0.049051)], mode=Mode.SUBTRACT)

    # Fillet
    fillet_edges = [part.edges().sort_by_distance(p)[0] for p in [
        (-76.2, 31.75, 3.81),
        (0, 31.75, 0),
        (76.2, 31.75, 3.81),
        (-76.2, 0, 0),
        (-76.2, -31.75, 3.81),
        (0, -31.75, 0),
        (76.2, -31.75, 3.81),
        (76.2, 0, 0),
    ]]
    fillet(fillet_edges, radius=FILLET_R)


solid = part.part
